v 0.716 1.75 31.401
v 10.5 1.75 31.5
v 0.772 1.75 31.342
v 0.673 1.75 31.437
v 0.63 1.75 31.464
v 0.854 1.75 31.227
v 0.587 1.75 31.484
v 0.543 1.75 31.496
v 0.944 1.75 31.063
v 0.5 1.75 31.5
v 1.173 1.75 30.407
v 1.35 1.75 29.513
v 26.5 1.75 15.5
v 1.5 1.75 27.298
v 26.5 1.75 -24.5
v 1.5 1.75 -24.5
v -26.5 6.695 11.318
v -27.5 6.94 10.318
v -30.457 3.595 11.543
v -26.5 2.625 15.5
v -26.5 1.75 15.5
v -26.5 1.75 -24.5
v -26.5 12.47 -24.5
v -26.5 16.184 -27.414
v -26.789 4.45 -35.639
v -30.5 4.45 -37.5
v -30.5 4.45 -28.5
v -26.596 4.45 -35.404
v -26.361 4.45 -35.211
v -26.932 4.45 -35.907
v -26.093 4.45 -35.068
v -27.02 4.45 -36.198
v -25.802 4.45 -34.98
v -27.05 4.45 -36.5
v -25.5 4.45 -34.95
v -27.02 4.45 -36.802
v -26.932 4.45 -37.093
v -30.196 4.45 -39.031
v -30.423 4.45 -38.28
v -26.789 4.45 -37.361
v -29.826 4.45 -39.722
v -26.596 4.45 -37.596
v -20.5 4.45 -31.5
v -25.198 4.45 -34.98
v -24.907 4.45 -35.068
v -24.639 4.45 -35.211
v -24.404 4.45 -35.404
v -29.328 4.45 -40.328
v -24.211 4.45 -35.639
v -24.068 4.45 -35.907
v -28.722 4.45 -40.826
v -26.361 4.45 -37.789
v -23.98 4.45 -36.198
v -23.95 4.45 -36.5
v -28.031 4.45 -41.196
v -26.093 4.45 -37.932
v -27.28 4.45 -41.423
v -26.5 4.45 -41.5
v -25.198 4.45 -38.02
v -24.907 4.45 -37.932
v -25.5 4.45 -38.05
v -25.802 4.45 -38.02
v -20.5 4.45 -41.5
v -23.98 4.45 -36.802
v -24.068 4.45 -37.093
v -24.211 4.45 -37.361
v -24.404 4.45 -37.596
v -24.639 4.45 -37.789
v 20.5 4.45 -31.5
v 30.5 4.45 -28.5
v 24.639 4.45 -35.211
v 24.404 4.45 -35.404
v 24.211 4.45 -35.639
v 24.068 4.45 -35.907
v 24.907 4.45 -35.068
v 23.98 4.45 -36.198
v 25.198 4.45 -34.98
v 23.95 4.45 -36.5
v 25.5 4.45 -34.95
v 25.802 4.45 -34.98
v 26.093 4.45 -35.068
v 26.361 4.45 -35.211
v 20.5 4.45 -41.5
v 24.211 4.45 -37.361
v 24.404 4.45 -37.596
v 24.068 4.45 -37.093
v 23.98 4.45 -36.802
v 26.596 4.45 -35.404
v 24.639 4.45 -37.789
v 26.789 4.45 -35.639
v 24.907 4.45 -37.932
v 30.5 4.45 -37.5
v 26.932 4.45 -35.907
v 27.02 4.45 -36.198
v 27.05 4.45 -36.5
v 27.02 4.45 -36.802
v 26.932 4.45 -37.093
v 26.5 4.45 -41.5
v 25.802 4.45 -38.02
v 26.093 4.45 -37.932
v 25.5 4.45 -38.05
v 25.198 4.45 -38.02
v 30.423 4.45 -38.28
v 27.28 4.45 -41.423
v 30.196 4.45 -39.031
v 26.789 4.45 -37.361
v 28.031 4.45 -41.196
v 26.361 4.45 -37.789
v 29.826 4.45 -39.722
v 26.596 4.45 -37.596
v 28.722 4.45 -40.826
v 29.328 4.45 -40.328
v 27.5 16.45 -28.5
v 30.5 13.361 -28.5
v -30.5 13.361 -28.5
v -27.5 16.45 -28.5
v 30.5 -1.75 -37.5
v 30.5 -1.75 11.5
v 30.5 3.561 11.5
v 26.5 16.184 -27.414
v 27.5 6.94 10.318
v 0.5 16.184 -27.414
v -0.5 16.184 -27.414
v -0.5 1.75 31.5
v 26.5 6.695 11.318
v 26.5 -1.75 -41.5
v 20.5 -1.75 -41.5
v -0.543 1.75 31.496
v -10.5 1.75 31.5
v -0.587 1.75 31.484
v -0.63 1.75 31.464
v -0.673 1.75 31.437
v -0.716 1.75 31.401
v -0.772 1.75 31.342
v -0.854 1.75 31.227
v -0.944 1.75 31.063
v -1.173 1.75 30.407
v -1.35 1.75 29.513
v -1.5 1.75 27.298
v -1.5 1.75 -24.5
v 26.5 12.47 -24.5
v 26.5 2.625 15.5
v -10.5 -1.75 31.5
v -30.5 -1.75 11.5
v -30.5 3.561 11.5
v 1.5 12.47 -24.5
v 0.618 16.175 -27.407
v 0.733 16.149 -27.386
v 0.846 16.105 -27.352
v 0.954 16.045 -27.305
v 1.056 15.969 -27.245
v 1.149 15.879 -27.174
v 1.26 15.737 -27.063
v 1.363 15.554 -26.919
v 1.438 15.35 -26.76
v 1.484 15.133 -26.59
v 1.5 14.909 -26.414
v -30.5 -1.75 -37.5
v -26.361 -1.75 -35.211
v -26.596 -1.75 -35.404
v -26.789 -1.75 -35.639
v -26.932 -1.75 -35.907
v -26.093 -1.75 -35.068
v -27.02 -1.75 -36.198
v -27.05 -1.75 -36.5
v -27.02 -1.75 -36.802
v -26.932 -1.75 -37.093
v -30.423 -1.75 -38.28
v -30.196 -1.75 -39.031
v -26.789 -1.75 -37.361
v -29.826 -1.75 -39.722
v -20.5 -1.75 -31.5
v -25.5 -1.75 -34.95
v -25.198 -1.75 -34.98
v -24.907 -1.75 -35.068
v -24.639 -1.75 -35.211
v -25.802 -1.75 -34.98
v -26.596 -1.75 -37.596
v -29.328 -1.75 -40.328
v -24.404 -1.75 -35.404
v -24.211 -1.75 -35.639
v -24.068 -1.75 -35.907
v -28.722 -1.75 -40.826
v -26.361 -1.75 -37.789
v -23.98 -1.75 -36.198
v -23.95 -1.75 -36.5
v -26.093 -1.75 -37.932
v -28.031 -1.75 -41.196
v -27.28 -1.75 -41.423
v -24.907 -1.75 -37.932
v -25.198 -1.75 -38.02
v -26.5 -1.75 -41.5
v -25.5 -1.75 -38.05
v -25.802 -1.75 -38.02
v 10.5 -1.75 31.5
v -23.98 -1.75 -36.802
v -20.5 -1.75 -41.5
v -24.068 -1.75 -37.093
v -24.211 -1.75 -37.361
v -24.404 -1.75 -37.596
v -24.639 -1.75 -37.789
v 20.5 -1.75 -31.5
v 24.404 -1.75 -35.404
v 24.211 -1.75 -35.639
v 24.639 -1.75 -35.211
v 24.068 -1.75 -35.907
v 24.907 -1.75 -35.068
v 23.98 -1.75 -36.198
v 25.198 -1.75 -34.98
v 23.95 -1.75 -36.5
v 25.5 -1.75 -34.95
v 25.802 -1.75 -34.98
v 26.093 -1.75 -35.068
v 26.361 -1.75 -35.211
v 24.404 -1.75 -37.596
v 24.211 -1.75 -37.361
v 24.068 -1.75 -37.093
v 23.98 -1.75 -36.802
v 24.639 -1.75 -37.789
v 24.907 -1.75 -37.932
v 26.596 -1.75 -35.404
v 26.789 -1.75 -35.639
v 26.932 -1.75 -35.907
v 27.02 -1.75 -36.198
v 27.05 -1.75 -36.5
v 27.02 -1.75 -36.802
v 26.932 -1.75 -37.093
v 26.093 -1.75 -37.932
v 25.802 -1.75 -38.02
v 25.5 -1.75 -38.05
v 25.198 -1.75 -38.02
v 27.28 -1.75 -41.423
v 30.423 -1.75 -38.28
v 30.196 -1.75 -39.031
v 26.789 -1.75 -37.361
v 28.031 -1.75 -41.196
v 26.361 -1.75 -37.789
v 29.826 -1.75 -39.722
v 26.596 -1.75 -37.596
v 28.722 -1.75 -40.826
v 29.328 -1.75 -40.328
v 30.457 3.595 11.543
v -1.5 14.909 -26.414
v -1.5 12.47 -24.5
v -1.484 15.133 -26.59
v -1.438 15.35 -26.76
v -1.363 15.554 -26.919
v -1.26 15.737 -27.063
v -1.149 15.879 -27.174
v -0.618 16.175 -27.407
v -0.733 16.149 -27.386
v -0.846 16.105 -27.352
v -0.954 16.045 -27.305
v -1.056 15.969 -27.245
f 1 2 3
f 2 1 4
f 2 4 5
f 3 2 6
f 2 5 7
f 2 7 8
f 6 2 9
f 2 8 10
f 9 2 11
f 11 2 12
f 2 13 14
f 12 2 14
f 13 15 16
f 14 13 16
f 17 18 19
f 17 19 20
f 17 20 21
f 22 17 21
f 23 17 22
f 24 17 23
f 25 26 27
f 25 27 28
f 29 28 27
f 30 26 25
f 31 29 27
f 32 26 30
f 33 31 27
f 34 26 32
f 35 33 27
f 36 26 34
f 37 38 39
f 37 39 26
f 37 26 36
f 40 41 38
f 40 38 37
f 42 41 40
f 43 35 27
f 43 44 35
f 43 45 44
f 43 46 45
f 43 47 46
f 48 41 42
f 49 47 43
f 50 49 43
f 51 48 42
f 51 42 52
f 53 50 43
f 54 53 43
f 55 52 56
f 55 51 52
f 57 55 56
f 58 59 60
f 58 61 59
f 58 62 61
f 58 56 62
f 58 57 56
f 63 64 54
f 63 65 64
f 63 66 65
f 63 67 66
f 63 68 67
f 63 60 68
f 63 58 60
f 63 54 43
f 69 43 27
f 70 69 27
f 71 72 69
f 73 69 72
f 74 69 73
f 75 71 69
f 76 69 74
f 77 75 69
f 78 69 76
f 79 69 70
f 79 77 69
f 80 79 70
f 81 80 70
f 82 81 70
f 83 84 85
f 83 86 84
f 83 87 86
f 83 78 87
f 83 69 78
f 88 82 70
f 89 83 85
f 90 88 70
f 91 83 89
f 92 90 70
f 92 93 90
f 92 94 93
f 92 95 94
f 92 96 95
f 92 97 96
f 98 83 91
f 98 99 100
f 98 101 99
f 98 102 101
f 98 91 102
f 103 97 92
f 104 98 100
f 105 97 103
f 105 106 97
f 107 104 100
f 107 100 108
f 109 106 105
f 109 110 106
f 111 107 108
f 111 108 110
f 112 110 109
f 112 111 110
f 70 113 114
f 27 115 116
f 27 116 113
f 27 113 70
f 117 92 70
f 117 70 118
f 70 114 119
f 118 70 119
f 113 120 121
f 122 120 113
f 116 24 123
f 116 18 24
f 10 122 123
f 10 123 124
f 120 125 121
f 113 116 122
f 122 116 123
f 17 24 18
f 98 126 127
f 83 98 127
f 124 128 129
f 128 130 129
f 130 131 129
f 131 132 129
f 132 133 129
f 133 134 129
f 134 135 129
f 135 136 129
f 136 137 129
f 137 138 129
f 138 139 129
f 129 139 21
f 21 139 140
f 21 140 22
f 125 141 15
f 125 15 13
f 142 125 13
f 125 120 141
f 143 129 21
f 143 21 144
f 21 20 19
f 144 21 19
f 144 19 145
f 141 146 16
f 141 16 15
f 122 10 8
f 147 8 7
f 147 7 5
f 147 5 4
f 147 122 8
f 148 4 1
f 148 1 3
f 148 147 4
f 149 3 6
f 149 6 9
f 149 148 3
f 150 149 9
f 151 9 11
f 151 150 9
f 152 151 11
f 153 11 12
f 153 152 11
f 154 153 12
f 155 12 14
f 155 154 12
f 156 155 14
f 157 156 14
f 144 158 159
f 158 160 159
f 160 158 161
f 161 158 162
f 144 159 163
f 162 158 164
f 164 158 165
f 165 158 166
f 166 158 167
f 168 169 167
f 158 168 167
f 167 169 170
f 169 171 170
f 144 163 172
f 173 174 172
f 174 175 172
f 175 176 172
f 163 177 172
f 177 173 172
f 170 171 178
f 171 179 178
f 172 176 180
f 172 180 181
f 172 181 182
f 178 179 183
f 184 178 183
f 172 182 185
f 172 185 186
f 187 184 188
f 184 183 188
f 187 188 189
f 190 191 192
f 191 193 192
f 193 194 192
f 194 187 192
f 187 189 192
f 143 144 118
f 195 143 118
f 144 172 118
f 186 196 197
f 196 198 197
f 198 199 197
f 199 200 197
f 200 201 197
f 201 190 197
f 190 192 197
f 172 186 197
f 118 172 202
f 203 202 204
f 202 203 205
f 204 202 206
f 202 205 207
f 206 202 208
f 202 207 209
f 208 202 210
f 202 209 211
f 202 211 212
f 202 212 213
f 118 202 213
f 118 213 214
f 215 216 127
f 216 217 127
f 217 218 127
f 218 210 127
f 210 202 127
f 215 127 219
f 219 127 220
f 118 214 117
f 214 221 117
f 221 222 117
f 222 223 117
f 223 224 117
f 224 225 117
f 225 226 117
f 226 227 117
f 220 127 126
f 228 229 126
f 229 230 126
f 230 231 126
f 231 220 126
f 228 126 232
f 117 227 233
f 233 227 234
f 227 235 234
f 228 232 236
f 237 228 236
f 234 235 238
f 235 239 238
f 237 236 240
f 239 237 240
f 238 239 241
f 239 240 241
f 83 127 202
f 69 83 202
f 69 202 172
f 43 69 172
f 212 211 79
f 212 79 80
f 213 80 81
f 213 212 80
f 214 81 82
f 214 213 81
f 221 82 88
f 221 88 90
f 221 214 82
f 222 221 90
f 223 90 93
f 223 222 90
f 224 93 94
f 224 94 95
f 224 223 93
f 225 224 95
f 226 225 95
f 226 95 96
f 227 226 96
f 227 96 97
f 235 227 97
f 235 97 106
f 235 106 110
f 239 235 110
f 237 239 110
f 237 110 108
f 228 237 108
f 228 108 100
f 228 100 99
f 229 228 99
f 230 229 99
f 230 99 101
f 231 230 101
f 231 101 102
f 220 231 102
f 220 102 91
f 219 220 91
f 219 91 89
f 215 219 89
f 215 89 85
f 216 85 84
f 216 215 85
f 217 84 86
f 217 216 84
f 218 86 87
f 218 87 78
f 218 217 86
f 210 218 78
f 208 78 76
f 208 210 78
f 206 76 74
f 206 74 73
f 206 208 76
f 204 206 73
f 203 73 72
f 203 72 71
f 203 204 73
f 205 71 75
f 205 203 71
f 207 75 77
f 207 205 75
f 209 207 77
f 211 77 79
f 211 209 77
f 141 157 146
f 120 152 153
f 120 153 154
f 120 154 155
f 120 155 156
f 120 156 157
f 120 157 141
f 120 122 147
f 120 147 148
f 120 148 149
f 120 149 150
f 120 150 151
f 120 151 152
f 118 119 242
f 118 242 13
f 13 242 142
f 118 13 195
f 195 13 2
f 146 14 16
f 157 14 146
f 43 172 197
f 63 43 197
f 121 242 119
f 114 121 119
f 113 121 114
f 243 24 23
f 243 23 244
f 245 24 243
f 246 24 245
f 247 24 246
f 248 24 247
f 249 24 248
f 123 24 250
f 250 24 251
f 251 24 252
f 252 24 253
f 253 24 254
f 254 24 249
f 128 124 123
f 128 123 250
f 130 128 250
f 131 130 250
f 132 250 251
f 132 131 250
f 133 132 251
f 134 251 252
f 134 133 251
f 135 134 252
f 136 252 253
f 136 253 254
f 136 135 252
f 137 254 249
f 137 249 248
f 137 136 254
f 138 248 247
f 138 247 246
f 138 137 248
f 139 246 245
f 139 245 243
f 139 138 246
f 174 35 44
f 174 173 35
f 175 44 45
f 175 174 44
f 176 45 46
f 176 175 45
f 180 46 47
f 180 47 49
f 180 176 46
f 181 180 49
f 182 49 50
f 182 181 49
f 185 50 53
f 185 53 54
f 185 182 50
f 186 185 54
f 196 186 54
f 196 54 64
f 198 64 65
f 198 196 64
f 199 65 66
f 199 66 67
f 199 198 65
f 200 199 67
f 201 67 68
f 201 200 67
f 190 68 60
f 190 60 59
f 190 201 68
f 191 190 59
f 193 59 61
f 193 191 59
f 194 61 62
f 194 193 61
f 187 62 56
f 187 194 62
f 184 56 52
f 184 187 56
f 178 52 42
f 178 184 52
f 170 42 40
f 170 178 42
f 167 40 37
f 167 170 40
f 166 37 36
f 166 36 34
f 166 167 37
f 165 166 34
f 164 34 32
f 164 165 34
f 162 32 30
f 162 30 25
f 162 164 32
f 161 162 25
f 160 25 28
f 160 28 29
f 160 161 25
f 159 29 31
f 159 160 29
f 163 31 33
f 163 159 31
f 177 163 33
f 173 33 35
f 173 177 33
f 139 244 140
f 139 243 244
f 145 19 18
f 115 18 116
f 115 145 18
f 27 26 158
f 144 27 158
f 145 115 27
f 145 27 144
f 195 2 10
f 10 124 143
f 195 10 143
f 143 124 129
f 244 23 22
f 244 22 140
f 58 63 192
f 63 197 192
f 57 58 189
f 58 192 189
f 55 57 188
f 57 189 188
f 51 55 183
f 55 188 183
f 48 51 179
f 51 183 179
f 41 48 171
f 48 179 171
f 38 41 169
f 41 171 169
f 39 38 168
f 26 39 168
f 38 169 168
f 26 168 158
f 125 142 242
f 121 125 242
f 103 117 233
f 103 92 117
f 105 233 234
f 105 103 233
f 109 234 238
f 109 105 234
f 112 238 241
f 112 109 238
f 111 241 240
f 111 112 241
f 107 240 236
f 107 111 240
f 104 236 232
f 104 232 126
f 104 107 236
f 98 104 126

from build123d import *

# Parameters (mm, degrees)
SKETCH1_R                = 1.55
BOSS_EXTRUDE1_DEPTH      = 1.75
SKETCH2_R                = 1.55
BOSS_EXTRUDE2_DEPTH      = 2.7
BOSS_EXTRUDE3_DEPTH      = 30.5
BOSS_EXTRUDE3_DEPTH_BACK = 30.5
CUT_EXTRUDE1_DEPTH       = 14.7
CHAMFER2_SIZE            = 3
FILLET2_R                = 1


with BuildPart() as part:
    # Sketch1 → Boss-Extrude1 (new, symmetric)
    # profile 1 of 3: a face of its own
    with BuildSketch(Plane(origin=(0, 0, 0), x_dir=(1, 0, 0), z_dir=(0, 1, 0))):
        Polygon((-10.5, -31.5), (-30.5, -11.5), (-30.5, 31.5), (30.5, 31.5), (30.5, -11.5), (10.5, -31.5), align=None)
    # profile 2 of 3: a face of its own
    with BuildSketch(Plane(origin=(0, 0, 0), x_dir=(1, 0, 0), z_dir=(0, 1, 0))):
        with BuildLine():
            Line((20.5, 31.5), (30.5, 31.5))
            Line((30.5, 31.5), (30.5, 37.5))
            ThreePointArc((30.5, 37.5), (29.328427125, 40.328427125), (26.5, 41.5))
            Line((26.5, 41.5), (20.5, 41.5))
            Line((20.5, 41.5), (20.5, 31.5))
        make_face()
        with Locations(Location((25.5, 36.5, 0), (0, 0, 270))):
            Circle(SKETCH1_R, mode=Mode.SUBTRACT)
    # profile 3 of 3: a face of its own
    with BuildSketch(Plane(origin=(0, 0, 0), x_dir=(1, 0, 0), z_dir=(0, 1, 0))):
        with BuildLine():
            Line((-30.5, 31.5), (-20.5, 31.5))
            Line((-20.5, 31.5), (-20.5, 41.5))
            Line((-20.5, 41.5), (-26.5, 41.5))
            ThreePointArc((-26.5, 41.5), (-29.328427125, 40.328427125), (-30.5, 37.5))
            Line((-30.5, 37.5), (-30.5, 31.5))
        make_face()
        with Locations(Location((-25.5, 36.5, 0), (0, 0, 270))):
            Circle(SKETCH1_R, mode=Mode.SUBTRACT)
    extrude(amount=BOSS_EXTRUDE1_DEPTH, both=True)

    # Sketch2 → Boss-Extrude2 (add)
    # profile 1 of 3: a face of its own
    with BuildSketch(Plane(origin=(0, 1.75, 0), x_dir=(1, 0, 0), z_dir=(0, 1, 0))):
        with BuildLine():
            Line((-20.5, 31.5), (-20.5, 41.5))
            Line((-20.5, 41.5), (-26.5, 41.5))
            ThreePointArc((-26.5, 41.5), (-29.328427125, 40.328427125), (-30.5, 37.5))
            Line((-30.5, 37.5), (-30.5, 31.5))
            Line((-30.5, 31.5), (-20.5, 31.5))
        make_face()
        with Locations(Location((-25.5, 36.5, 0), (0, 0, 270))):
            Circle(SKETCH2_R, mode=Mode.SUBTRACT)
    # profile 2 of 3: a face of its own
    with BuildSketch(Plane(origin=(0, 1.75, 0), x_dir=(1, 0, 0), z_dir=(0, 1, 0))):
        Polygon((20.5, 31.5), (-20.5, 31.5), (-30.5, 31.5), (-30.5, 28.5), (30.5, 28.5), (30.5, 31.5), align=None)
    # profile 3 of 3: a face of its own
    with BuildSketch(Plane(origin=(0, 1.75, 0), x_dir=(1, 0, 0), z_dir=(0, 1, 0))):
        with BuildLine():
            Line((20.5, 41.5), (20.5, 31.5))
            Line((20.5, 31.5), (30.5, 31.5))
            Line((30.5, 31.5), (30.5, 37.5))
            ThreePointArc((30.5, 37.5), (29.328427125, 40.328427125), (26.5, 41.5))
            Line((26.5, 41.5), (20.5, 41.5))
        make_face()
        with Locations(Location((25.5, 36.5, 0), (0, 0, 270))):
            Circle(SKETCH2_R, mode=Mode.SUBTRACT)
    extrude(amount=BOSS_EXTRUDE2_DEPTH)

    # Sketch3 → Boss-Extrude3 (add, two sides: drawn at the far end of the back side and taken through both)
    with BuildSketch(Plane(origin=(0, 0, 0), x_dir=(0, 0, -1), z_dir=(1, 0, 0)).offset(-BOSS_EXTRUDE3_DEPTH_BACK)):
        Polygon((28.5, 1.75), (-31.5, 1.75), (28.5, 16.45), align=None)
    extrude(amount=BOSS_EXTRUDE3_DEPTH + BOSS_EXTRUDE3_DEPTH_BACK)

    # Sketch4 → Cut-Extrude1 (cut)
    with BuildSketch(Plane(origin=(0, 16.45, 0), x_dir=(-1, 0, 0), z_dir=(0, -1, 0))):
        Polygon((26.5, -15.5), (26.5, 24.5), (1.5, 24.5), (1.5, -31.5), (10.5, -31.5), align=None)
        Polygon((-26.5, -15.5), (-10.5, -31.5), (-1.5, -31.5), (-1.5, 24.5), (-26.5, 24.5), align=None)
        Polygon((26.5, -31.5), (26.5, -15.5), (10.5, -31.5), align=None)
        Polygon((30.5, -11.5), (26.5, -15.5), (26.5, -31.5), (30.5, -31.5), align=None)
        Polygon((-26.5, -15.5), (-26.5, -31.5), (-10.5, -31.5), align=None)
        Polygon((-30.5, -31.5), (-26.5, -31.5), (-26.5, -15.5), (-30.5, -11.5), align=None)
    extrude(amount=CUT_EXTRUDE1_DEPTH, mode=Mode.SUBTRACT)

    # Chamfer2
    chamfer2_edges = [part.edges().sort_by_distance(p)[0] for p in [
        (28.5, 6.16, 13.5),
        (14, 15.47, -24.5),
        (-14, 15.47, -24.5),
        (-28.5, 6.16, 13.5),
        (-30.5, 11.55, -8.5),
        (30.5, 11.55, -8.5),
    ]]
    chamfer(chamfer2_edges, length=CHAMFER2_SIZE)

    # Fillet2
    fillet2_edges = [part.edges().sort_by_distance(p)[0] for p in [
        (1.5, 8.966943345, 2.043088387),
        (-1.5, 8.966943345, 2.043088387),
    ]]
    fillet(fillet2_edges, radius=FILLET2_R)


solid = part.part
